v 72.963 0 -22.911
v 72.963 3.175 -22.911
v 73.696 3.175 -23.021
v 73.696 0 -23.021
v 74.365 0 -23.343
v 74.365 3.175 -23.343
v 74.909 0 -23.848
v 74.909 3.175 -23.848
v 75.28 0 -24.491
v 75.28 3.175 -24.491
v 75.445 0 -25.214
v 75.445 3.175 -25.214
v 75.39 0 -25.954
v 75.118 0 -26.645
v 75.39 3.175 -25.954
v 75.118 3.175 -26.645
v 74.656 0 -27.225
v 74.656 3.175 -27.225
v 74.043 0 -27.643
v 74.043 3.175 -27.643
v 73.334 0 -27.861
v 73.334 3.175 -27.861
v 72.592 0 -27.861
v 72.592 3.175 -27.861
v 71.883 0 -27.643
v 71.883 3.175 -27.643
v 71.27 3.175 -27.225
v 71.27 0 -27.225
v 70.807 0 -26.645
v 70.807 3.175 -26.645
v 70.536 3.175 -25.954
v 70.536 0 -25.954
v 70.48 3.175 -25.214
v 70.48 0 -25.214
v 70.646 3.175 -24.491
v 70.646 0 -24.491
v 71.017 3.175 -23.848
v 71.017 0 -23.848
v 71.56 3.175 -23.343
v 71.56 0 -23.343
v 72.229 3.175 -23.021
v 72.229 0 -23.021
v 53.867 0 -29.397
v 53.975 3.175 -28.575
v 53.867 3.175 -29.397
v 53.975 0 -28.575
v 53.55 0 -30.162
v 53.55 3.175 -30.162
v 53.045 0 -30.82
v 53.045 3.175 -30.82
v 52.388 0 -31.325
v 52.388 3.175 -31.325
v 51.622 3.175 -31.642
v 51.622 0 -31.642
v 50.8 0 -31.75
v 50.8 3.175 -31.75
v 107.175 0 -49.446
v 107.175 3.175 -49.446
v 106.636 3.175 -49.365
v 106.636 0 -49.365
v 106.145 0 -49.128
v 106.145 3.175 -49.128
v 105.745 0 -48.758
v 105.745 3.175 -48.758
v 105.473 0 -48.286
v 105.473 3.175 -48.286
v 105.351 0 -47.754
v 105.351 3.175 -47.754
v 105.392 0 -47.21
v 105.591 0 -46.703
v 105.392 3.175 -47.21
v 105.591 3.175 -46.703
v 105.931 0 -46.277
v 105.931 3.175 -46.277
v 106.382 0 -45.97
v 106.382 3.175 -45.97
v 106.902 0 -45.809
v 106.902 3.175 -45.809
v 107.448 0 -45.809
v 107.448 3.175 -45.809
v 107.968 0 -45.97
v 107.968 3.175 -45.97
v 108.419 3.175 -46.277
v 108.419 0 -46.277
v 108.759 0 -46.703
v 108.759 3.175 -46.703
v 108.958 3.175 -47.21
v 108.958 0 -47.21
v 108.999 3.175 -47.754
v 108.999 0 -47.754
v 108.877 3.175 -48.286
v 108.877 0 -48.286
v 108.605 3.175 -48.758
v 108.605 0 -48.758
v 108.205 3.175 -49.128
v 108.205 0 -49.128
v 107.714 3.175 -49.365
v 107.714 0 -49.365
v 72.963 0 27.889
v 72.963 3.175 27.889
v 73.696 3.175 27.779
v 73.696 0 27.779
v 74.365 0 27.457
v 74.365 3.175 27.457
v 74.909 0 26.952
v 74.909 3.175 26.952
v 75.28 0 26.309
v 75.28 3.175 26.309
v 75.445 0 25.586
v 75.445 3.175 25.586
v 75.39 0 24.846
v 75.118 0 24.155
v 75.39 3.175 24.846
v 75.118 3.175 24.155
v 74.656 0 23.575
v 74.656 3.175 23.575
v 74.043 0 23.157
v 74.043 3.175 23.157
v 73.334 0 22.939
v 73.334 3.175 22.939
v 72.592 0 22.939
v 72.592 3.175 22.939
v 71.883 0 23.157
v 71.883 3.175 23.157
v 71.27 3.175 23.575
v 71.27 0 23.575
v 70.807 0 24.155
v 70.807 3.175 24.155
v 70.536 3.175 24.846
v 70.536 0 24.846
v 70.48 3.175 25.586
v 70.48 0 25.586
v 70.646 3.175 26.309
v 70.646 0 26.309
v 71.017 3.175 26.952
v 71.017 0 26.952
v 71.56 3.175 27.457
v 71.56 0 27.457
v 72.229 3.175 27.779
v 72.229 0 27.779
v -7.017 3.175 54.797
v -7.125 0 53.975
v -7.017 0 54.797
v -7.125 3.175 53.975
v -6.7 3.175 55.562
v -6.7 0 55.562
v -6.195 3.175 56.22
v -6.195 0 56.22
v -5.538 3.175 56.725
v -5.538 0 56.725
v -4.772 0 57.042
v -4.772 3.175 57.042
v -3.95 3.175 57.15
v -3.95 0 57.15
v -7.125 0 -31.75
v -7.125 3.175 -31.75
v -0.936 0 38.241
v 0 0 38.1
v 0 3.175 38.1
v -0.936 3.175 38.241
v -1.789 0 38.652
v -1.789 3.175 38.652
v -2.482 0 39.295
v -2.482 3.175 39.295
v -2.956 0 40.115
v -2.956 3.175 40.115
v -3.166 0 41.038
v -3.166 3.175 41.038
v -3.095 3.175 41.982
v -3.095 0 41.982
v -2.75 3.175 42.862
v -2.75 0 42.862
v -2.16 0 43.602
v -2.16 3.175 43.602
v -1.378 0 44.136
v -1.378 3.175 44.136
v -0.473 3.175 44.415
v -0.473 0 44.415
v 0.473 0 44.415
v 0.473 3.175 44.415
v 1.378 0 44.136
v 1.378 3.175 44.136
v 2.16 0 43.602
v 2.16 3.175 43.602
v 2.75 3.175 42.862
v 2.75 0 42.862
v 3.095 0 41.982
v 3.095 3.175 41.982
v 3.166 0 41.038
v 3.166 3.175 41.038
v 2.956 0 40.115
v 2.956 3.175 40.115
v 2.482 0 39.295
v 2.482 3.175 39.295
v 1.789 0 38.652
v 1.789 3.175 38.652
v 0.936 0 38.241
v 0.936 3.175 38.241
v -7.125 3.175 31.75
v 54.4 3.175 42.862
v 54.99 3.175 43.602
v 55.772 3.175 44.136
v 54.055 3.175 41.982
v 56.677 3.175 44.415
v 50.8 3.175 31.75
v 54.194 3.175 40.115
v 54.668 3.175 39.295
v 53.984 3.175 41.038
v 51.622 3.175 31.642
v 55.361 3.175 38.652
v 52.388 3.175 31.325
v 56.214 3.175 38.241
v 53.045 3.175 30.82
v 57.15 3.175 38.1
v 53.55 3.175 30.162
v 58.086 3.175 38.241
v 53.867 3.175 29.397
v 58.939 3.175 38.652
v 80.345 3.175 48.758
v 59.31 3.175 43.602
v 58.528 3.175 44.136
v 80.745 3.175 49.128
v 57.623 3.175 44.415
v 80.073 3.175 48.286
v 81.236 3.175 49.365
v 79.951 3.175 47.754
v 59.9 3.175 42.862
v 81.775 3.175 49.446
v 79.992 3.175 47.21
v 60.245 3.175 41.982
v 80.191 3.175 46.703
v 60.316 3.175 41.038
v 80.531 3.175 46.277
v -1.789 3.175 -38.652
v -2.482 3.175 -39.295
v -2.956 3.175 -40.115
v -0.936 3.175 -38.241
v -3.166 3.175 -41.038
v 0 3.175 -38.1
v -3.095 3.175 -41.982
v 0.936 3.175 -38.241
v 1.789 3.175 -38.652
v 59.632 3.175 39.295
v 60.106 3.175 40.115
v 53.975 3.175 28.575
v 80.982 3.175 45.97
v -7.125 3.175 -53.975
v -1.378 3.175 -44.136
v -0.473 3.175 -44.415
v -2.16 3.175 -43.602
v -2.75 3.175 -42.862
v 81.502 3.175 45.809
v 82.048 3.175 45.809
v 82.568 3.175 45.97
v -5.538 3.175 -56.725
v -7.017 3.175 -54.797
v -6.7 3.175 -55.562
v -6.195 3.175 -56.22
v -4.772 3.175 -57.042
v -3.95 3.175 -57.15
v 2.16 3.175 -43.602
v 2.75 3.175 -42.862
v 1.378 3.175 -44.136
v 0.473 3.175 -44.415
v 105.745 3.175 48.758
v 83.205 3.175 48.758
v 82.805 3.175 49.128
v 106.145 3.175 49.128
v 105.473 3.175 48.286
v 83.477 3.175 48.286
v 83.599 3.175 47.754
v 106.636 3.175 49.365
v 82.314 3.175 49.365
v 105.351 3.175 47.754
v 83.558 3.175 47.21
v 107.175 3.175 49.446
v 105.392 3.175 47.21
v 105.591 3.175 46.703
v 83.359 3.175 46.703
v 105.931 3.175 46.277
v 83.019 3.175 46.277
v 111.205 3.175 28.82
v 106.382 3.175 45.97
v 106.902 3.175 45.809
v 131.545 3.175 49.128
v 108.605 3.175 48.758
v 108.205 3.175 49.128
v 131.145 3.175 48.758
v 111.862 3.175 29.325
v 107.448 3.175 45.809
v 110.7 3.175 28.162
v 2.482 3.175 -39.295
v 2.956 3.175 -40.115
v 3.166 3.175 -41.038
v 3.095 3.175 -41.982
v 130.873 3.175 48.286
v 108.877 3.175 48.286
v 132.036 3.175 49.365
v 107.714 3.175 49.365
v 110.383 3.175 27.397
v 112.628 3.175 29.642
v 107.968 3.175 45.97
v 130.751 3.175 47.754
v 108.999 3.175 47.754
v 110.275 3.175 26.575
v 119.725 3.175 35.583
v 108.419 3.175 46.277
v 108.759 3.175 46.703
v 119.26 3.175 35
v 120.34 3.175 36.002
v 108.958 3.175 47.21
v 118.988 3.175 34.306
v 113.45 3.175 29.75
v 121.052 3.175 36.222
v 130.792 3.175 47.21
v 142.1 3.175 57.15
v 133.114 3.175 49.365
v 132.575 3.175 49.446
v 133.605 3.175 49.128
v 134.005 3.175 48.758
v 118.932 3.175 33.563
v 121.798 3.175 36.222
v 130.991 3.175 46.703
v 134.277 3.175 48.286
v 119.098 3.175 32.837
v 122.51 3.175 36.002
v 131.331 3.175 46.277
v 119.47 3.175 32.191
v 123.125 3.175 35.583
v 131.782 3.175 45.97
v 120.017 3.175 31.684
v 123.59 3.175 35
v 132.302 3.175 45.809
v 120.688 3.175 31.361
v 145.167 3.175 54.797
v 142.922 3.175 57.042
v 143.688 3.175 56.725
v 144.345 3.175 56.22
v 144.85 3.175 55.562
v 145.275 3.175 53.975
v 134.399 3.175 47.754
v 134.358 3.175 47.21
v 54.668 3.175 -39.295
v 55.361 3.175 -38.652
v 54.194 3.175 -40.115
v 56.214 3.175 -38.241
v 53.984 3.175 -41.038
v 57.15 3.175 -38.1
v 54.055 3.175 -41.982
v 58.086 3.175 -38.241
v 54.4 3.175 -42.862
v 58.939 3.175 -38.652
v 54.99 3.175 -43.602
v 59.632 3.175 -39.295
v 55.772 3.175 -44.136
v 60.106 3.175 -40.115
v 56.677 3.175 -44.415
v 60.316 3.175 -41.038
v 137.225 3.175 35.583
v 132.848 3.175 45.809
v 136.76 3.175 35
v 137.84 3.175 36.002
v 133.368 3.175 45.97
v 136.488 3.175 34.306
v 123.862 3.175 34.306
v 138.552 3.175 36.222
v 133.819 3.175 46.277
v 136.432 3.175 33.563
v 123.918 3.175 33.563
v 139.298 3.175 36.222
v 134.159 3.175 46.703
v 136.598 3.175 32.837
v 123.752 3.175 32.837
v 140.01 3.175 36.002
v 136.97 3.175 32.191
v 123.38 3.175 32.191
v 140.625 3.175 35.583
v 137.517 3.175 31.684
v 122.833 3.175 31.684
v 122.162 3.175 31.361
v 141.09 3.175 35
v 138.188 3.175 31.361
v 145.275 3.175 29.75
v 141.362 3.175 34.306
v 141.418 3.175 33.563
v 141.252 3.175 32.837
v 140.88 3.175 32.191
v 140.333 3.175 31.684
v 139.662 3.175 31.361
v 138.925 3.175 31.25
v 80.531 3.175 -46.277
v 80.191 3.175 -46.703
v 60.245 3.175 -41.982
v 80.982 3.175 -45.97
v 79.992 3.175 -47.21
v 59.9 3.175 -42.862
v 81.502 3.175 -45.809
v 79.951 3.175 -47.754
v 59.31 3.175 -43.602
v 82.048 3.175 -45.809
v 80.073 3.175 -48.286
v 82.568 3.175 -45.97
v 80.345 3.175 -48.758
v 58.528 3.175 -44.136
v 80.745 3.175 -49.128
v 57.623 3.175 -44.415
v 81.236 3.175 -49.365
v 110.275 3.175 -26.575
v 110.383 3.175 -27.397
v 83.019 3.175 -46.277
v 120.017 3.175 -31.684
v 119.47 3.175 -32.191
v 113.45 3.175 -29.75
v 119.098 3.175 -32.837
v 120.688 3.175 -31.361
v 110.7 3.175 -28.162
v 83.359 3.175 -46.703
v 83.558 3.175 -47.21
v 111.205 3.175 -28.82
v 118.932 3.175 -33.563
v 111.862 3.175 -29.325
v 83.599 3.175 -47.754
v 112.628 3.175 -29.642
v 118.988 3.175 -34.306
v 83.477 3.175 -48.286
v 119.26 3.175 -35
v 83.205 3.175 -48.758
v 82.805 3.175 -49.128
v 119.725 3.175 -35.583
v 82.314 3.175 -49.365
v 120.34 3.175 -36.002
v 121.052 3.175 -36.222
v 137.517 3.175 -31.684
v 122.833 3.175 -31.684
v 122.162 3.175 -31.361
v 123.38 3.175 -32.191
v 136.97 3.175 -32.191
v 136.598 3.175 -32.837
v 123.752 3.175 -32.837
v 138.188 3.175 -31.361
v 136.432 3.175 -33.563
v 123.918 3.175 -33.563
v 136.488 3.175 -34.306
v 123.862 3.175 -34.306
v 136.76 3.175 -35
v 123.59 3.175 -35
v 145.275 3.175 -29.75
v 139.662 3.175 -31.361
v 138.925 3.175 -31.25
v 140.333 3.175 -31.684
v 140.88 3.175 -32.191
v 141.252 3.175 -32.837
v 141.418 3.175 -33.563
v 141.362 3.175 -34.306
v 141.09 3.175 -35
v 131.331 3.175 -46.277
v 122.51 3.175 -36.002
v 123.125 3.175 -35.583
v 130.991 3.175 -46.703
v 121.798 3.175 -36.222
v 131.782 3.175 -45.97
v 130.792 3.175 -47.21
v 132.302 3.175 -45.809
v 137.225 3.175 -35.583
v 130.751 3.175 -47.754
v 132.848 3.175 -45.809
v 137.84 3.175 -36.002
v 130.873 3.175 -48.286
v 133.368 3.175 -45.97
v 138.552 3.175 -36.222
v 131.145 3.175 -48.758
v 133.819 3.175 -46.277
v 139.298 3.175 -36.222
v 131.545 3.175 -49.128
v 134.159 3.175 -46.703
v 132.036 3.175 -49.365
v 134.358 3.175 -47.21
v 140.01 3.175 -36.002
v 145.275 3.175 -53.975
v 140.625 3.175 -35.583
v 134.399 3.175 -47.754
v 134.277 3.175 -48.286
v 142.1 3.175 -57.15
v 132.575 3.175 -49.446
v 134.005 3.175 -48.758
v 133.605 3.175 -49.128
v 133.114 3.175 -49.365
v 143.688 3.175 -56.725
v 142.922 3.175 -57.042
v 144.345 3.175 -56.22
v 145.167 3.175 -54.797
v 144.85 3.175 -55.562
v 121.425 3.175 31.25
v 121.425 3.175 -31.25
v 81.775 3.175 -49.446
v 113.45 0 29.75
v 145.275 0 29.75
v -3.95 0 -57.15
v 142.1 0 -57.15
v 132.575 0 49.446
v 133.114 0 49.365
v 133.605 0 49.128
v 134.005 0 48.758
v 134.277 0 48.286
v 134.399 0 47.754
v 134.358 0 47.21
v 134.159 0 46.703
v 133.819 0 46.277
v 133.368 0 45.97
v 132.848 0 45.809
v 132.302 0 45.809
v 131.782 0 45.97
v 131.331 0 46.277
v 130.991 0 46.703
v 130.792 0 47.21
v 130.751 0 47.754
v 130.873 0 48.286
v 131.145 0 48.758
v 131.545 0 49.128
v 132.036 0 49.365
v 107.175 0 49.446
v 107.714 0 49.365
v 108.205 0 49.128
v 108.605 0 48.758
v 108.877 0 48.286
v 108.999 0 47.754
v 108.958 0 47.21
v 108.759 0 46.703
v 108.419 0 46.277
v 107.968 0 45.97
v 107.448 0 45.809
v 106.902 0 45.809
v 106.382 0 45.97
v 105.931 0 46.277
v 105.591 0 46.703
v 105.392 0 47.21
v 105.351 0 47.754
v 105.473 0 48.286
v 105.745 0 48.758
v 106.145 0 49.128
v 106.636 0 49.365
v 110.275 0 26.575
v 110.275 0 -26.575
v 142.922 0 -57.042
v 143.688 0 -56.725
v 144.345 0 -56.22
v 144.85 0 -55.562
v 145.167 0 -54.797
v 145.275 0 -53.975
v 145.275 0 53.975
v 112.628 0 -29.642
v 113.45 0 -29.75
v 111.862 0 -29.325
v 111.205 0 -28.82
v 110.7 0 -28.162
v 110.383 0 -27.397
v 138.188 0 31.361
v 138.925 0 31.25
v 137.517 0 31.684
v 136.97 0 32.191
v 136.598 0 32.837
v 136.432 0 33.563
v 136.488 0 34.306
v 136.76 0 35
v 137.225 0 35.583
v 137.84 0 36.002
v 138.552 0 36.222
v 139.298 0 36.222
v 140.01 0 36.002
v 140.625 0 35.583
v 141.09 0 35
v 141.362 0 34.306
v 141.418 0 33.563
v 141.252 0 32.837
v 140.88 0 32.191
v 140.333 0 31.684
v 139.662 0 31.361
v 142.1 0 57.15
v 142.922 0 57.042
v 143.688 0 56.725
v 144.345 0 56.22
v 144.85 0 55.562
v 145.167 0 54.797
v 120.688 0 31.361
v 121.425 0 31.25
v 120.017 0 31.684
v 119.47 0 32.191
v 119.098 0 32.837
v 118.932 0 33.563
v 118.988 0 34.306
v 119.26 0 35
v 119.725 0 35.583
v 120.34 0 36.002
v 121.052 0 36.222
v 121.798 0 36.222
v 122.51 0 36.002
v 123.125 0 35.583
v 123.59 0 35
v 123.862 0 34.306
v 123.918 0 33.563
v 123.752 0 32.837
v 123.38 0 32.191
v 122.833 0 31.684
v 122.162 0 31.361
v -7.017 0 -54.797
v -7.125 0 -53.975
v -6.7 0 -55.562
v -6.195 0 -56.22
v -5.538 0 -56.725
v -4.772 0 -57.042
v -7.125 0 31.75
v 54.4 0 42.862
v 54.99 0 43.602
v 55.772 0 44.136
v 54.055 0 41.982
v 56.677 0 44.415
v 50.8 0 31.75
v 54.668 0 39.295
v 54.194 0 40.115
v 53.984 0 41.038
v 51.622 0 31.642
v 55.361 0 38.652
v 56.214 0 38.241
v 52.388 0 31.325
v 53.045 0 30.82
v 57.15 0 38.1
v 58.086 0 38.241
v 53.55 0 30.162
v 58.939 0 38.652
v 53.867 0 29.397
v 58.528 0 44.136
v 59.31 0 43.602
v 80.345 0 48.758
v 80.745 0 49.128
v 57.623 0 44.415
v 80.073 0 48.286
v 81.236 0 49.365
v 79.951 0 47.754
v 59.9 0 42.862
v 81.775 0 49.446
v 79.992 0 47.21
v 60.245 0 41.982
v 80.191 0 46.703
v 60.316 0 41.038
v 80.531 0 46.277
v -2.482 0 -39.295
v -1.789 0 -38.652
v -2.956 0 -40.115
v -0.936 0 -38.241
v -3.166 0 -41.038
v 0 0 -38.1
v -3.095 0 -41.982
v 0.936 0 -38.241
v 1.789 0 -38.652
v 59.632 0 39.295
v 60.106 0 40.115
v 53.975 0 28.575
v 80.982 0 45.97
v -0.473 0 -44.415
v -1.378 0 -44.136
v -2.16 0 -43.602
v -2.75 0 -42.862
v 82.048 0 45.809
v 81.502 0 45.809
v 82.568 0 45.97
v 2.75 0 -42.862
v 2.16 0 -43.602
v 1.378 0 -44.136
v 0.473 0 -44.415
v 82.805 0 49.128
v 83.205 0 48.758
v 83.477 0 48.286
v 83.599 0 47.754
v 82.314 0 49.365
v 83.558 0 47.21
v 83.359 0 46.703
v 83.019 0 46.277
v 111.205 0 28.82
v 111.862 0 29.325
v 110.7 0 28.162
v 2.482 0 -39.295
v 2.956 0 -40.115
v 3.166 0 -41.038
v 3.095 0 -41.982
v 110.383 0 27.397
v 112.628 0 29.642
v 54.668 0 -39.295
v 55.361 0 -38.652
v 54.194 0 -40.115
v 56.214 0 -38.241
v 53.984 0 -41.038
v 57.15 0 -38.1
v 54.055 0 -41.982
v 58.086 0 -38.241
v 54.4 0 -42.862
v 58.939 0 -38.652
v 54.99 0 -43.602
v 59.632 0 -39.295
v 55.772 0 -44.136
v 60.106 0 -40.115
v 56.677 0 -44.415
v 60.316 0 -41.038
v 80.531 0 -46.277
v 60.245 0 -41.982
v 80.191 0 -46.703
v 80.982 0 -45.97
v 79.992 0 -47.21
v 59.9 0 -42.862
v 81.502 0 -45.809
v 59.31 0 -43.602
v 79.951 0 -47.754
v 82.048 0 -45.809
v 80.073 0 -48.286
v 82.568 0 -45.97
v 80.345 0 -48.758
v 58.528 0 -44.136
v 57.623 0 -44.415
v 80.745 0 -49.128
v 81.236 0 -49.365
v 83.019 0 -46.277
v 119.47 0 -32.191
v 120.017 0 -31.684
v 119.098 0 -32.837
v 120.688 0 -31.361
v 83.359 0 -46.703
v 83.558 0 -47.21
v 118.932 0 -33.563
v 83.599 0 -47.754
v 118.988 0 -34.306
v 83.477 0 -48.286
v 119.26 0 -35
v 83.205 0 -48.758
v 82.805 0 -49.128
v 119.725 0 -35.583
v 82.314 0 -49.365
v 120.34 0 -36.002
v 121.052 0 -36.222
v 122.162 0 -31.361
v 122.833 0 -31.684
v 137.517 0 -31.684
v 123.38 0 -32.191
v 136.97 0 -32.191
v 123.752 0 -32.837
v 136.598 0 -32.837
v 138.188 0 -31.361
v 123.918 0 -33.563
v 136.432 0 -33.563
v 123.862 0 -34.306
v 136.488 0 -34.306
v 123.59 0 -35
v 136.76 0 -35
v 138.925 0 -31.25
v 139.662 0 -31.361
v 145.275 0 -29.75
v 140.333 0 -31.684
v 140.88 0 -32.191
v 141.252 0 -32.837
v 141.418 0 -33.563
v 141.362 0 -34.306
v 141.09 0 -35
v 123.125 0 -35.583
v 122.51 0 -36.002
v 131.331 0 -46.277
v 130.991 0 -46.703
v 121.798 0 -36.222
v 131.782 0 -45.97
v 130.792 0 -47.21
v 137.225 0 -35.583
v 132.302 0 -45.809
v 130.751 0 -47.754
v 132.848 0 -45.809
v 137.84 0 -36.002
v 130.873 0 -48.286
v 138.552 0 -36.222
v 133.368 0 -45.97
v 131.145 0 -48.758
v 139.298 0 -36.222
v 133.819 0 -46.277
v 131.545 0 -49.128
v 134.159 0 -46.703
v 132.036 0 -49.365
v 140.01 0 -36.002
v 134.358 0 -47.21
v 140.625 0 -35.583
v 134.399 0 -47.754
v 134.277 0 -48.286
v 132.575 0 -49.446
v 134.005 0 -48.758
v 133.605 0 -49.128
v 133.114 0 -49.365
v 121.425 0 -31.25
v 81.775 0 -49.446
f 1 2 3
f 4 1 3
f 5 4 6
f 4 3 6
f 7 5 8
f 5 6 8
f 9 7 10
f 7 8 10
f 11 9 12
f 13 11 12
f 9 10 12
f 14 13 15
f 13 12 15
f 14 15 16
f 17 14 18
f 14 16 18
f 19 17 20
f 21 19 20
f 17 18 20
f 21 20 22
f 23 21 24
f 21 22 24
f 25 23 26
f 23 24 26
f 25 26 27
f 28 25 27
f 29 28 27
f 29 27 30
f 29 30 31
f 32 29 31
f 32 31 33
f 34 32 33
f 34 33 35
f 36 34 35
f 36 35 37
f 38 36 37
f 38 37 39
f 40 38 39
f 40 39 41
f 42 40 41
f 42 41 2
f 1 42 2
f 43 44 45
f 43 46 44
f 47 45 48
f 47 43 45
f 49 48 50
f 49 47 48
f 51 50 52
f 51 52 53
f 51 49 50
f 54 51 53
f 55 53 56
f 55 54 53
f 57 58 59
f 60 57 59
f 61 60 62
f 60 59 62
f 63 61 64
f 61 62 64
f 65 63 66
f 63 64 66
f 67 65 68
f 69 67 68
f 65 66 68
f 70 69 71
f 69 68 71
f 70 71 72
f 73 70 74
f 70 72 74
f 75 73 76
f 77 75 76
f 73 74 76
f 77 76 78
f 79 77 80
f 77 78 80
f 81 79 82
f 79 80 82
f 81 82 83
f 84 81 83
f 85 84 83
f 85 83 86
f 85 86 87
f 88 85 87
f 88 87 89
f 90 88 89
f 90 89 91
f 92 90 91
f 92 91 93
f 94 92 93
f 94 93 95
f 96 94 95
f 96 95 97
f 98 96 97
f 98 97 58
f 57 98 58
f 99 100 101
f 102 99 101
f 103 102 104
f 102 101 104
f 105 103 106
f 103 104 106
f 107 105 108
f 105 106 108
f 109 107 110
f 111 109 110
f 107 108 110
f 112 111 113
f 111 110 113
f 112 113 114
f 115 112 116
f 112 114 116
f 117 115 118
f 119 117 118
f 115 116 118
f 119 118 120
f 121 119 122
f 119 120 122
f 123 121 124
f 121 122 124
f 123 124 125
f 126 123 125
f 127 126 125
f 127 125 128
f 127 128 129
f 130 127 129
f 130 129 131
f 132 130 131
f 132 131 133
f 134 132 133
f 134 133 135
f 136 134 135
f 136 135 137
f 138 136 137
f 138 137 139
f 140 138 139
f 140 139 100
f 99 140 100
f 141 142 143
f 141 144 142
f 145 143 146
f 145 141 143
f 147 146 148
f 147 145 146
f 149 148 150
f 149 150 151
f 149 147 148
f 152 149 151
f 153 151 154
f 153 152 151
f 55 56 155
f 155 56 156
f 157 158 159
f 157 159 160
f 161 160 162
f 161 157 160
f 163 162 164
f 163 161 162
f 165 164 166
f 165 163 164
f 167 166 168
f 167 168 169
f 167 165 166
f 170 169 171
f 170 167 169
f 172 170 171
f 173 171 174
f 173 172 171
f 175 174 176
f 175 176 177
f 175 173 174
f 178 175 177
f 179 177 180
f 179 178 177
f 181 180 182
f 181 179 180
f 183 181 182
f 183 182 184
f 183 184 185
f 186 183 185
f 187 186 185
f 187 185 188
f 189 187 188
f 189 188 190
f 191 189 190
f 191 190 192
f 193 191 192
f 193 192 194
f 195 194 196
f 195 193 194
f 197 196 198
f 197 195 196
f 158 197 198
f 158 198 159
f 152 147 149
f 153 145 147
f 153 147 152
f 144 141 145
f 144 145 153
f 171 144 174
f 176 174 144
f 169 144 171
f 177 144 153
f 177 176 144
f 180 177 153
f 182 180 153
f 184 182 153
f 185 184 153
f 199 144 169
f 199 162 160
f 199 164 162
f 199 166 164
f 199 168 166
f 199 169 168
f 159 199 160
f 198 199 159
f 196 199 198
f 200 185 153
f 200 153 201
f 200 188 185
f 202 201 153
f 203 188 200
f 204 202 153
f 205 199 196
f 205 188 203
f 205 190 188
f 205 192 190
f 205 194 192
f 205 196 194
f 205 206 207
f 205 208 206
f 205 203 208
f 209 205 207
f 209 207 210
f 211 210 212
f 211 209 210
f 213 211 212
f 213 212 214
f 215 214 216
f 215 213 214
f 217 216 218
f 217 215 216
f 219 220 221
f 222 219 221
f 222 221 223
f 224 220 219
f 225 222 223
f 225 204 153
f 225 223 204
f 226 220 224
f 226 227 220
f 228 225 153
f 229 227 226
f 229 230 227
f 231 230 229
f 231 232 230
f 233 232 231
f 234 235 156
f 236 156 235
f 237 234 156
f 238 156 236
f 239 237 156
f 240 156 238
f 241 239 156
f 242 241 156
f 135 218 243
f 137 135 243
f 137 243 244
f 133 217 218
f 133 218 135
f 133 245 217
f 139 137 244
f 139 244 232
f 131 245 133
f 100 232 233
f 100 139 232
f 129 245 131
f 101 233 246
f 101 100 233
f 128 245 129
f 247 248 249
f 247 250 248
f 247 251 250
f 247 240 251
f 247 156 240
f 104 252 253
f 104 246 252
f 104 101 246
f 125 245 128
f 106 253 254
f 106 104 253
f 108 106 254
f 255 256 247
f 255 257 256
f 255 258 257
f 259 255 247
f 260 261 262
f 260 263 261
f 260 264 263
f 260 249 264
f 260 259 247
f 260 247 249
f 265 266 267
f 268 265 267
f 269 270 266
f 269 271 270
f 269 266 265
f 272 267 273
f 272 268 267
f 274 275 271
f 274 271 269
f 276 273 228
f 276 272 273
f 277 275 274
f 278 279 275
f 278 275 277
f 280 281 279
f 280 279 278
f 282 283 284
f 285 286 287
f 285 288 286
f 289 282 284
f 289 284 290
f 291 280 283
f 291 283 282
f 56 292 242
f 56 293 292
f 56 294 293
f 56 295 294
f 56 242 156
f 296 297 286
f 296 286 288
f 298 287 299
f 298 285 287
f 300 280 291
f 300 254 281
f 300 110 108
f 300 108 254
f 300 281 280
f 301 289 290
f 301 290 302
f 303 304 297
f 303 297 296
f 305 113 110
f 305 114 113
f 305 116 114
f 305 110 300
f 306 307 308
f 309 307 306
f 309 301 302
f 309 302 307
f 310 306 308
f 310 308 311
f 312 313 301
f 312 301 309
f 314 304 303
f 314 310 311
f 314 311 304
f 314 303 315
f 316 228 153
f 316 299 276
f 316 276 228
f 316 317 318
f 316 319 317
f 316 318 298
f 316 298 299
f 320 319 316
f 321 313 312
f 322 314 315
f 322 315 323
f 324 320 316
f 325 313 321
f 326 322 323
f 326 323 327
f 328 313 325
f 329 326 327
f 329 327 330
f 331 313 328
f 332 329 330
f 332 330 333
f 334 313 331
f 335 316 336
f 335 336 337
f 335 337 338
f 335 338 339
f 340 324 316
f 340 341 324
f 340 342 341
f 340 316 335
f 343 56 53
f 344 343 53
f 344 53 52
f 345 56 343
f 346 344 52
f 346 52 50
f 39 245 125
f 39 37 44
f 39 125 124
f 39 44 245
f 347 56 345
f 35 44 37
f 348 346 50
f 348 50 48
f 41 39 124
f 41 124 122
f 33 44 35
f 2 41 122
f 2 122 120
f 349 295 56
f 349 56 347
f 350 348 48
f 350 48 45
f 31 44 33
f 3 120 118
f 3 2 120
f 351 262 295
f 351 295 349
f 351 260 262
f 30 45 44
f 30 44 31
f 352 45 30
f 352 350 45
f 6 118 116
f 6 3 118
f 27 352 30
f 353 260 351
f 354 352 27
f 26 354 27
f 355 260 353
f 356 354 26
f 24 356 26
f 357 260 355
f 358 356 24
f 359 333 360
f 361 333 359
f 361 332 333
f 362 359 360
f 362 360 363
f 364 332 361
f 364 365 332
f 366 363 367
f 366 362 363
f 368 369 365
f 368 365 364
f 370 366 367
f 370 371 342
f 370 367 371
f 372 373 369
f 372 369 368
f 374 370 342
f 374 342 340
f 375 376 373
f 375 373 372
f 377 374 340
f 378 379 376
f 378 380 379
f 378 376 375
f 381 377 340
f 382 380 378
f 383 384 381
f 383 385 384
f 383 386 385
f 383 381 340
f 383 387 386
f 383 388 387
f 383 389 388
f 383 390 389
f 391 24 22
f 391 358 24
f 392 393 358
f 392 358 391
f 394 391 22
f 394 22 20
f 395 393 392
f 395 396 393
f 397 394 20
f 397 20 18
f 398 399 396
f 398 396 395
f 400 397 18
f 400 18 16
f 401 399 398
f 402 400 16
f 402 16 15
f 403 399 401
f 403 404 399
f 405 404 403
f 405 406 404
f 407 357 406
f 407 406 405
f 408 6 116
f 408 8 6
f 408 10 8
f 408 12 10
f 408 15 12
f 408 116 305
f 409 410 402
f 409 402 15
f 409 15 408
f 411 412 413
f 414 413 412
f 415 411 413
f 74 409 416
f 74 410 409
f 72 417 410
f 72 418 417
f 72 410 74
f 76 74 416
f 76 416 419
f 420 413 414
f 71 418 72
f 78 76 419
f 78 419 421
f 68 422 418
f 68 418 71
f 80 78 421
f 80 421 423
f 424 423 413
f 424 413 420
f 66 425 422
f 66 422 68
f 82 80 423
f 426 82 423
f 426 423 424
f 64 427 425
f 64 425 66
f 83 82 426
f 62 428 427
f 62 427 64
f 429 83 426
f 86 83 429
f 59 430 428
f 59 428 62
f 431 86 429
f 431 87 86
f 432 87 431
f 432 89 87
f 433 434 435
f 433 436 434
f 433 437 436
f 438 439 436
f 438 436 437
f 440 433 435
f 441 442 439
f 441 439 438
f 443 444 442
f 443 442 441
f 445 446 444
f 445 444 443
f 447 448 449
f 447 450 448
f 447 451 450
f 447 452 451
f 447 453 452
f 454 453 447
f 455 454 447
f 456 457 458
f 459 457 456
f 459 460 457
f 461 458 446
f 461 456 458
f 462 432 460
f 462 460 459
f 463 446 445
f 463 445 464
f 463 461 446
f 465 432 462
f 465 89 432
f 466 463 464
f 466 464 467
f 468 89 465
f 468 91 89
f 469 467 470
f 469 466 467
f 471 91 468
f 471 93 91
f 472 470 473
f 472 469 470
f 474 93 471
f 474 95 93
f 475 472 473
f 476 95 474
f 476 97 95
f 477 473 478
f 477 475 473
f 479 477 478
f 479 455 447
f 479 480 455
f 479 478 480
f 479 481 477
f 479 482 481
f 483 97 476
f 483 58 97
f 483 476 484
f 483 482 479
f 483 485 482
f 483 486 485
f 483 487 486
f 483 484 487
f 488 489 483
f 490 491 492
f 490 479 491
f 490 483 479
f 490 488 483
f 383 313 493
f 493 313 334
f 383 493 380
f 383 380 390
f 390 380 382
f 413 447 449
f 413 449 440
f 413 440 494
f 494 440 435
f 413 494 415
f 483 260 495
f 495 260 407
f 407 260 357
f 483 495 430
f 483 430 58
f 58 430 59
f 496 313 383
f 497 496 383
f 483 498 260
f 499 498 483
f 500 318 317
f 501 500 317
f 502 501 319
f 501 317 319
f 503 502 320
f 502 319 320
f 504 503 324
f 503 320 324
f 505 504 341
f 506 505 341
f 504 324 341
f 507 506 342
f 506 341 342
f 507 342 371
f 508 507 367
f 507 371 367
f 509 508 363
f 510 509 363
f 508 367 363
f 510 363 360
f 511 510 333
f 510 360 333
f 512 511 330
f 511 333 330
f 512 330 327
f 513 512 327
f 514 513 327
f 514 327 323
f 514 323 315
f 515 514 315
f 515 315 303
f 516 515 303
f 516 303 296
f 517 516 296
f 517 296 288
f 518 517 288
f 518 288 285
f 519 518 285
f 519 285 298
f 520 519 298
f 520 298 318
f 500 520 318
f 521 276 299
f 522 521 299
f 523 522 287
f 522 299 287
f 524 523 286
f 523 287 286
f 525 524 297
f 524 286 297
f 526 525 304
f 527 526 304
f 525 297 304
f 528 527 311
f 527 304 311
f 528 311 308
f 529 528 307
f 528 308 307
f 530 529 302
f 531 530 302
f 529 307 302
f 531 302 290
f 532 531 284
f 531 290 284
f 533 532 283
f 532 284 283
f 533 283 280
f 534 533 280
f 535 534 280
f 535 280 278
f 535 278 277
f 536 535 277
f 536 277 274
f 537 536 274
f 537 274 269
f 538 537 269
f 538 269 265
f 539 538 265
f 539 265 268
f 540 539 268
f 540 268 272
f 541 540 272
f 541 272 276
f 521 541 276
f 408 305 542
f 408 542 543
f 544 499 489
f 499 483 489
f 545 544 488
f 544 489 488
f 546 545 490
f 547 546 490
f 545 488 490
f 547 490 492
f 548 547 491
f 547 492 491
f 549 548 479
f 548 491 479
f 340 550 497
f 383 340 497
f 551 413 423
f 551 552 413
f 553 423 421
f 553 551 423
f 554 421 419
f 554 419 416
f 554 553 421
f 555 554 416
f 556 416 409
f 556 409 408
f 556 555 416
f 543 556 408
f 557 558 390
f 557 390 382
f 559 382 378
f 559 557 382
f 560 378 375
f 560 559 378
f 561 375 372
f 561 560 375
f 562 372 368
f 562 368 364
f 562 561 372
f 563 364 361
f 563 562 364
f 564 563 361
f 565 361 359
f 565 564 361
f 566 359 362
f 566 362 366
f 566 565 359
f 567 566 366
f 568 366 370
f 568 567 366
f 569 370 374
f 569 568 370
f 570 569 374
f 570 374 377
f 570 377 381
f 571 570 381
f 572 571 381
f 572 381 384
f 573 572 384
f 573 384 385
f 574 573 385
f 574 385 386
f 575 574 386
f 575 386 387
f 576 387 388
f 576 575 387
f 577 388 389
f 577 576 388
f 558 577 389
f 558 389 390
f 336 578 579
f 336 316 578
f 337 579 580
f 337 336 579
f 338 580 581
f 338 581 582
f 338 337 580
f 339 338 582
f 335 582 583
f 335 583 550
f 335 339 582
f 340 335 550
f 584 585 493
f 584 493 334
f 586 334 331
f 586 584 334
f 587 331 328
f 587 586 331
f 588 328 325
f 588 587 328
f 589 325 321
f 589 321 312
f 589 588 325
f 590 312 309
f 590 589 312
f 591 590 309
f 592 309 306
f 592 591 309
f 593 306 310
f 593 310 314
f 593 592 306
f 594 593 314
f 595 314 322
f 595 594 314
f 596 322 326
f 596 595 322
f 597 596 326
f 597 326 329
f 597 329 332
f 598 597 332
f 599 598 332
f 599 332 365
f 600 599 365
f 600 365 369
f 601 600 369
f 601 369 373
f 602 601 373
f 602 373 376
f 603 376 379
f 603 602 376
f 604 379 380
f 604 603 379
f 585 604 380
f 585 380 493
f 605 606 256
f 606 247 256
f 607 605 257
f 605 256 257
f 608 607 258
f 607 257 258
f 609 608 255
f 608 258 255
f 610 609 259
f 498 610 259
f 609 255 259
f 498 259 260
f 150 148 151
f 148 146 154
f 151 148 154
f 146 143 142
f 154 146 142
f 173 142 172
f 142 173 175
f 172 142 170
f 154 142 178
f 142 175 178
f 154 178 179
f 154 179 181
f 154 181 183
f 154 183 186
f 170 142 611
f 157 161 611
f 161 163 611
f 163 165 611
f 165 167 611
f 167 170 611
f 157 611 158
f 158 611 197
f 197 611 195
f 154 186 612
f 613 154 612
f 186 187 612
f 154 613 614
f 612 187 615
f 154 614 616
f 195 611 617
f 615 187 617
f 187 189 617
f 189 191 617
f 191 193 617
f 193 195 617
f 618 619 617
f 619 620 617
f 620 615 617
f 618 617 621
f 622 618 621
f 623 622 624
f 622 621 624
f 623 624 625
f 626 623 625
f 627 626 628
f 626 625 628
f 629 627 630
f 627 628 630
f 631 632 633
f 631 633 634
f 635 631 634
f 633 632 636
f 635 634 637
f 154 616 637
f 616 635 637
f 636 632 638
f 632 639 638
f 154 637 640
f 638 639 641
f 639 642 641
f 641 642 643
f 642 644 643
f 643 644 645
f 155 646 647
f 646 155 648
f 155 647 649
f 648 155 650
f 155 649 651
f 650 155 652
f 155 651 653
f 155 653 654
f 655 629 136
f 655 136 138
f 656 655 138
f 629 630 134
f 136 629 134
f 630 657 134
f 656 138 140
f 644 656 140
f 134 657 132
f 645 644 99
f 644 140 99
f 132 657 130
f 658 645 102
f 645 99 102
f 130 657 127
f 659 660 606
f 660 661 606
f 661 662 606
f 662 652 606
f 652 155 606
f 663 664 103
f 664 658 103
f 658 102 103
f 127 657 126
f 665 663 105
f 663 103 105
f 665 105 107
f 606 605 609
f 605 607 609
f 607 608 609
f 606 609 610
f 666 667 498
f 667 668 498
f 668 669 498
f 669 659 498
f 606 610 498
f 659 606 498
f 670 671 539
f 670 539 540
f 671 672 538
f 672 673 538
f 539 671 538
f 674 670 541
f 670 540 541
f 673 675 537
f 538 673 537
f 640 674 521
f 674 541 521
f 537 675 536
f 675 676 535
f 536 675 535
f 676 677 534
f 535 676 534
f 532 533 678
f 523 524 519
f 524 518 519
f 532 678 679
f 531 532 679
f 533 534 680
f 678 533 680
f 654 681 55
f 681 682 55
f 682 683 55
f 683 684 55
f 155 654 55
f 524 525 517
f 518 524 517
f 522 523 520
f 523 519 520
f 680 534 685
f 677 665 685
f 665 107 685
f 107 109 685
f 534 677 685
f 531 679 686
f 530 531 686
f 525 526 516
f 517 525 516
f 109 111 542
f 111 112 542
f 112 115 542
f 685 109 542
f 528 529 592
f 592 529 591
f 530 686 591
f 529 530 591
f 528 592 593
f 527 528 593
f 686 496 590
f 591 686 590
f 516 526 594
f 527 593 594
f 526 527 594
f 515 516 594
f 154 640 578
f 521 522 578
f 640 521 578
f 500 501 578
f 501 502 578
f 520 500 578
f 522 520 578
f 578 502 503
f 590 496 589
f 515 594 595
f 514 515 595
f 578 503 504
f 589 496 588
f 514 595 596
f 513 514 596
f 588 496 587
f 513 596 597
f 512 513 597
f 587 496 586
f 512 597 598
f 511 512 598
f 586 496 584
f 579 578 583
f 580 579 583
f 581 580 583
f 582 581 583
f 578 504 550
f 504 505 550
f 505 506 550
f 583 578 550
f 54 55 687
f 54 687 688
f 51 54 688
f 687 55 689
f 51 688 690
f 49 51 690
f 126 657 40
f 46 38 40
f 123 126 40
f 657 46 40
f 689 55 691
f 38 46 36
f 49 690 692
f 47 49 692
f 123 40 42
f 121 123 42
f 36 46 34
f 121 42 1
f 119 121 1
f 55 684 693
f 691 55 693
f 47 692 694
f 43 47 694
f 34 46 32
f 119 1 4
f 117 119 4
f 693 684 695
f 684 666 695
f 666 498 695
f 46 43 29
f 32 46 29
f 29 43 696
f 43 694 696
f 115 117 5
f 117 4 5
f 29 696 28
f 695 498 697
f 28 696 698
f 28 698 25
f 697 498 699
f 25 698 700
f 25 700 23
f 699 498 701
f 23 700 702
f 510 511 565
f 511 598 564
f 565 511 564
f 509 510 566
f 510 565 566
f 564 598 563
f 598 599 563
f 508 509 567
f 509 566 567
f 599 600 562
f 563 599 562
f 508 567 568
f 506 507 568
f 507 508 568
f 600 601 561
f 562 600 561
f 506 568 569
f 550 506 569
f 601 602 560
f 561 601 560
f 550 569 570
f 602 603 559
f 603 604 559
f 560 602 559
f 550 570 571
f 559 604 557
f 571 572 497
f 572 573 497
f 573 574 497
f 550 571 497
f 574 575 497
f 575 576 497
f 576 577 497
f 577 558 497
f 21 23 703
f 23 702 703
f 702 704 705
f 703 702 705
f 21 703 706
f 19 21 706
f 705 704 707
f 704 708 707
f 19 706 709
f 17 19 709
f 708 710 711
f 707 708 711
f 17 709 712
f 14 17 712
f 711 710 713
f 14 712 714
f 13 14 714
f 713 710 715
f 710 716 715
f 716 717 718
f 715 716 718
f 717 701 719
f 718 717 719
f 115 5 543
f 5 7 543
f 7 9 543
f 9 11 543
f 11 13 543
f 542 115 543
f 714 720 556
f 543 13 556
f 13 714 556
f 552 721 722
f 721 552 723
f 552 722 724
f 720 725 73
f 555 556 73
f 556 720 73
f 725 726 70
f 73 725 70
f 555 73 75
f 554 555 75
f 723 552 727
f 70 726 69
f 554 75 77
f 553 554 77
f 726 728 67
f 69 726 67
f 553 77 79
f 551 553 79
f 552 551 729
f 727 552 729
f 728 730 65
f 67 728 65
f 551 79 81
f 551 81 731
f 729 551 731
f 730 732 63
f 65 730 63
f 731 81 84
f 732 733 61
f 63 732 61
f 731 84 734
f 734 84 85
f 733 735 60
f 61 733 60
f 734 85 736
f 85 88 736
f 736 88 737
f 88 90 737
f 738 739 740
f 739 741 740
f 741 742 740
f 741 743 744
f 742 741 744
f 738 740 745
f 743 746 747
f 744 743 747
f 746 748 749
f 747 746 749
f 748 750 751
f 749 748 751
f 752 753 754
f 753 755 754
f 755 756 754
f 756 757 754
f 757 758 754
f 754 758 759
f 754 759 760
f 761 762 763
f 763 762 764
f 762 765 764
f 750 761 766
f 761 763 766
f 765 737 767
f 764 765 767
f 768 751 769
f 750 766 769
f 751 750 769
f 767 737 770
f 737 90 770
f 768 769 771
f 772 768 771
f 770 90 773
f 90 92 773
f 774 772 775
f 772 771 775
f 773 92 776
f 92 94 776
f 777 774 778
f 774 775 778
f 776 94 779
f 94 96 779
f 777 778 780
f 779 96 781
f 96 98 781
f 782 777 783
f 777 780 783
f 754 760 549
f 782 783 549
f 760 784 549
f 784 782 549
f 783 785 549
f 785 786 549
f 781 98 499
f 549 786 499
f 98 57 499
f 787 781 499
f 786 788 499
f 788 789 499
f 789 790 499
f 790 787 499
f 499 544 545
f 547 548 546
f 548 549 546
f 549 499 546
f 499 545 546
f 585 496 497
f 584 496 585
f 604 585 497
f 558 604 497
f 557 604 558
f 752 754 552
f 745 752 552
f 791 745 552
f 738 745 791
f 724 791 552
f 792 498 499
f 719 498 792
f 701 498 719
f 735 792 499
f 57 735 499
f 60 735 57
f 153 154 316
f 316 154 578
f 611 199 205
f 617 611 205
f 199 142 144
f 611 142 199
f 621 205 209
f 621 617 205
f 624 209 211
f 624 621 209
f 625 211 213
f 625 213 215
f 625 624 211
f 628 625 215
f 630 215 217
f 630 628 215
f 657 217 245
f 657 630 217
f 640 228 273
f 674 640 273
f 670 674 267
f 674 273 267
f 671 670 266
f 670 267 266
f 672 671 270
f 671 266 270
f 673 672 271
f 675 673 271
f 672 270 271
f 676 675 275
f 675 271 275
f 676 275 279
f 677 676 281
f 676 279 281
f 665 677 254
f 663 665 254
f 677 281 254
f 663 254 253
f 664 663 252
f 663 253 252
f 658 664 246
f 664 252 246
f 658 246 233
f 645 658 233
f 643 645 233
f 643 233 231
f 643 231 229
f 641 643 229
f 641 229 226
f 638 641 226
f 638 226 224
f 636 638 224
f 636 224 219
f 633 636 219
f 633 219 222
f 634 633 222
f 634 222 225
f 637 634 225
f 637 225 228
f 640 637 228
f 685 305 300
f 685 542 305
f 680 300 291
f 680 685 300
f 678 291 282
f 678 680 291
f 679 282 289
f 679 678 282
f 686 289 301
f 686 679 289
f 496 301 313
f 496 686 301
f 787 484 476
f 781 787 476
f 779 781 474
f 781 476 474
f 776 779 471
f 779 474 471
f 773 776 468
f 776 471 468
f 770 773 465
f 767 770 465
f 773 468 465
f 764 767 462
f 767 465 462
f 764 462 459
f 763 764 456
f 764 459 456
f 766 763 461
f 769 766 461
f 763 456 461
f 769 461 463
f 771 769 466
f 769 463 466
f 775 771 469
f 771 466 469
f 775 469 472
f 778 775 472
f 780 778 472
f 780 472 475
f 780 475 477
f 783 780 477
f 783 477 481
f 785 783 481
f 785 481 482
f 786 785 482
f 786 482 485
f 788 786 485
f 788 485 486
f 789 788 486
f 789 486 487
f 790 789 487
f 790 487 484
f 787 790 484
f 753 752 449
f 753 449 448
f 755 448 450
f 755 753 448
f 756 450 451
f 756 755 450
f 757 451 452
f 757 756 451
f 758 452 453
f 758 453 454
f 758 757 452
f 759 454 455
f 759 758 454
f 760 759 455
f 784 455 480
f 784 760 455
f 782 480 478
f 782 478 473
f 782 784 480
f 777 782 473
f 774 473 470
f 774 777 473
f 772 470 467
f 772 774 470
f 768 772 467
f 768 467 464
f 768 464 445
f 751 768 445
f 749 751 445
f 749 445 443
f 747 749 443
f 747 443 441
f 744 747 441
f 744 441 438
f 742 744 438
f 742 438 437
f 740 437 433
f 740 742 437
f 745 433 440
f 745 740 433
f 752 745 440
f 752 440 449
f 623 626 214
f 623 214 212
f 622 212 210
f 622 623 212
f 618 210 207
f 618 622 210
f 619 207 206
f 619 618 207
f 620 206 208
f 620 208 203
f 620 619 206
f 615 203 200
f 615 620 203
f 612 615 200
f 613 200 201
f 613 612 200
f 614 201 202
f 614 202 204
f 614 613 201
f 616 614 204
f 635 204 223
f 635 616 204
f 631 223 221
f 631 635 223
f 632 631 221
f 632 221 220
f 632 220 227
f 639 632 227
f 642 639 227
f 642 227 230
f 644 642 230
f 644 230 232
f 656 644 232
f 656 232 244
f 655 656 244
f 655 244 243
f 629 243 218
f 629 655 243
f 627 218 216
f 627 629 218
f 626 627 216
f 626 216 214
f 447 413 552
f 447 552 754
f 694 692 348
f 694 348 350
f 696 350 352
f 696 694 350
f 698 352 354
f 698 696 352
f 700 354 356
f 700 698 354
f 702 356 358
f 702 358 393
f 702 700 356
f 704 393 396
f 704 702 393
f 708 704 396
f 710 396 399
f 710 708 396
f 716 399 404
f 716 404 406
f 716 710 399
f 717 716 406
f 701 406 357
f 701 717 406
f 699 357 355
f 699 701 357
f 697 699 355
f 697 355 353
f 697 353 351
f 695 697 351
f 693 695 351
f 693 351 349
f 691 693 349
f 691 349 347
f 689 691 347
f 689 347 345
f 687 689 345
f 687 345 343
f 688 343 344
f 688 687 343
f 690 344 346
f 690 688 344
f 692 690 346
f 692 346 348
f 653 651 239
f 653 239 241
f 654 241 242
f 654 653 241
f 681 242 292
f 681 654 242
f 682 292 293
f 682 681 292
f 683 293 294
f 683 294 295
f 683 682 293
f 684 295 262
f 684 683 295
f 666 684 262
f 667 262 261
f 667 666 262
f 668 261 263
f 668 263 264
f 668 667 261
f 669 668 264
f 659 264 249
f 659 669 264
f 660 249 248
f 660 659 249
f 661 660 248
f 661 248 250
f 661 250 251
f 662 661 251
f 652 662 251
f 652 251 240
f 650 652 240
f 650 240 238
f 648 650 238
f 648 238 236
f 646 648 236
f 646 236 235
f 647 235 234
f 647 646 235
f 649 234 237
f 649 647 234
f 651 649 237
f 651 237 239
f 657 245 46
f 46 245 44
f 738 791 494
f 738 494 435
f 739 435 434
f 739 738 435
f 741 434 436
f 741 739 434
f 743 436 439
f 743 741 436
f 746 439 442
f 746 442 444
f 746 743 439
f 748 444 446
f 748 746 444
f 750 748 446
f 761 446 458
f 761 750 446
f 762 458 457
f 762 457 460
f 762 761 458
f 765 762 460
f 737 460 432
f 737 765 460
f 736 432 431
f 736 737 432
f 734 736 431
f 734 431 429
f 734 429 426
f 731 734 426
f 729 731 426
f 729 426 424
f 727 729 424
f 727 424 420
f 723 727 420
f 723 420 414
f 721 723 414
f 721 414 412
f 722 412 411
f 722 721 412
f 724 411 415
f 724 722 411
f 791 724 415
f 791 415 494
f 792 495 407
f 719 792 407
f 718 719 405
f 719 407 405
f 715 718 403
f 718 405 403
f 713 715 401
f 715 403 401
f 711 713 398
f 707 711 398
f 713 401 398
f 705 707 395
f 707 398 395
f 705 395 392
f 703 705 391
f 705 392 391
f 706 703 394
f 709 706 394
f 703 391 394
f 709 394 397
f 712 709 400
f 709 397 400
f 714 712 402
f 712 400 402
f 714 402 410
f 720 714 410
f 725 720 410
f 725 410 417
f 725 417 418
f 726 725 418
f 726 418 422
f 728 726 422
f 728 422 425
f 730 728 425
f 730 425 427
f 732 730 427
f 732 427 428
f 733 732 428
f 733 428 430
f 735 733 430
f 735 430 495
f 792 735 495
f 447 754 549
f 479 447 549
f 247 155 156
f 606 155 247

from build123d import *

# Parameters (mm, degrees)
SKETCH1_W           = 152.4
SKETCH1_H           = 114.3
SKETCH1_R           = 3.175
SKETCH1_R_2         = 2.5
BOSS_EXTRUDE1_DEPTH = 3.175
CUT_EXTRUDE1_REACH  = 158.144
SKETCH2_W           = 35
SKETCH2_H           = 59.5
FILLET1_R           = 3.175
SKETCH4_R           = 2.4892
CUT_EXTRUDE2_DEPTH  = 157.144256218
SKETCH5_R           = 1.8288
CUT_EXTRUDE3_DEPTH  = 157.144256218


with BuildPart() as part:
    # Sketch1 → Boss-Extrude1 (new body)
    with BuildSketch(Plane(origin=(0, 0, 0), x_dir=(1, 0, 0), z_dir=(0, 1, 0))):
        with Locations((69.075, 0)):
            Rectangle(SKETCH1_W, SKETCH1_H)
        with Locations(Location((0, 41.275, 0), (0, 0, 270))):
            Circle(SKETCH1_R, mode=Mode.SUBTRACT)
        with Locations(Location((121.425, 33.75, 0), (0, 0, 270))):
            Circle(SKETCH1_R_2, mode=Mode.SUBTRACT)
        with Locations(Location((138.925, 33.75, 0), (0, 0, 270))):
            Circle(SKETCH1_R_2, mode=Mode.SUBTRACT)
        with Locations(Location((138.925, -33.75, 0), (0, 0, 90))):
            Circle(SKETCH1_R_2, mode=Mode.SUBTRACT)
        with Locations(Location((121.425, -33.75, 0), (0, 0, 90))):
            Circle(SKETCH1_R_2, mode=Mode.SUBTRACT)
        with Locations(Location((0, -41.275, 0), (0, 0, 90))):
            Circle(SKETCH1_R, mode=Mode.SUBTRACT)
        with Locations(Location((57.15, 41.275, 0), (0, 0, 270))):
            Circle(SKETCH1_R, mode=Mode.SUBTRACT)
        with Locations(Location((57.15, -41.275, 0), (0, 0, 90))):
            Circle(SKETCH1_R, mode=Mode.SUBTRACT)
    extrude(amount=BOSS_EXTRUDE1_DEPTH)

    # Sketch2 → Cut-Extrude1 (cut, up to next)
    with BuildSketch(Plane(origin=(0, 3.175, 0), x_dir=(1, 0, 0), z_dir=(0, 1, 0)), mode=Mode.PRIVATE) as cut_extrude1_sk1:
        with Locations((127.775, 0)):
            Rectangle(SKETCH2_W, SKETCH2_H)
    cut_extrude1_tool1 = extrude(cut_extrude1_sk1.sketch, amount=-CUT_EXTRUDE1_REACH, mode=Mode.PRIVATE) & part.part
    # Sketch2 → Cut-Extrude1 (cut, up to next)
    with BuildSketch(Plane(origin=(0, 3.175, 0), x_dir=(1, 0, 0), z_dir=(0, 1, 0)), mode=Mode.PRIVATE) as cut_extrude1_sk2:
        Polygon((-7.125, 0), (-7.125, -31.75), (53.975, -31.75), (53.975, 0), (53.975, 31.75), (-7.125, 31.75), align=None)
    cut_extrude1_tool2 = extrude(cut_extrude1_sk2.sketch, amount=-CUT_EXTRUDE1_REACH, mode=Mode.PRIVATE) & part.part
    add(cut_extrude1_tool1.solids().sort_by_distance((127.775, 3.175, 0))[0], mode=Mode.SUBTRACT)
    add(cut_extrude1_tool2.solids().sort_by_distance((23.425, 3.175, 0))[0], mode=Mode.SUBTRACT)

    # Fillet1
    fillet1_edges = [part.edges().sort_by_distance(p)[0] for p in [
        (110.275, 1.5875, 29.75),
        (110.275, 1.5875, -29.75),
        (53.975, 1.5875, 31.75),
        (53.975, 1.5875, -31.75),
        (145.275, 1.5875, -57.15),
        (145.275, 1.5875, 57.15),
        (-7.125, 1.5875, 57.15),
        (-7.125, 1.5875, -57.15),
    ]]
    fillet(fillet1_edges, radius=FILLET1_R)

    # Sketch4 → Cut-Extrude2 (cut, through all)
    with BuildSketch(Plane(origin=(0, 3.175, 0), x_dir=(1, 0, 0), z_dir=(0, 1, 0))):
        with Locations(Location((72.962713681, 25.4, 0), (0, 0, 270))):
            Circle(SKETCH4_R)
        with Locations(Location((72.962713681, -25.4, 0), (0, 0, 270))):
            Circle(SKETCH4_R)
    extrude(amount=-CUT_EXTRUDE2_DEPTH, mode=Mode.SUBTRACT)

    # Sketch5 → Cut-Extrude3 (cut, through all)
    with BuildSketch(Plane(origin=(0, 3.175, 0), x_dir=(1, 0, 0), z_dir=(0, 1, 0))):
        with Locations(Location((132.575, -47.61738, 0), (0, 0, 270))):
            Circle(SKETCH5_R)
        with Locations(Location((81.775, -47.61738, 0), (0, 0, 270))):
            Circle(SKETCH5_R)
        with Locations(Location((107.175, -47.61738, 0), (0, 0, 270))):
            Circle(SKETCH5_R)
        with Locations(Location((107.175, 47.61738, 0), (0, 0, 90))):
            Circle(SKETCH5_R)
        with Locations(Location((81.775, 47.61738, 0), (0, 0, 90))):
            Circle(SKETCH5_R)
        with Locations(Location((132.575, 47.61738, 0), (0, 0, 90))):
            Circle(SKETCH5_R)
    extrude(amount=-CUT_EXTRUDE3_DEPTH, mode=Mode.SUBTRACT)


solid = part.part
